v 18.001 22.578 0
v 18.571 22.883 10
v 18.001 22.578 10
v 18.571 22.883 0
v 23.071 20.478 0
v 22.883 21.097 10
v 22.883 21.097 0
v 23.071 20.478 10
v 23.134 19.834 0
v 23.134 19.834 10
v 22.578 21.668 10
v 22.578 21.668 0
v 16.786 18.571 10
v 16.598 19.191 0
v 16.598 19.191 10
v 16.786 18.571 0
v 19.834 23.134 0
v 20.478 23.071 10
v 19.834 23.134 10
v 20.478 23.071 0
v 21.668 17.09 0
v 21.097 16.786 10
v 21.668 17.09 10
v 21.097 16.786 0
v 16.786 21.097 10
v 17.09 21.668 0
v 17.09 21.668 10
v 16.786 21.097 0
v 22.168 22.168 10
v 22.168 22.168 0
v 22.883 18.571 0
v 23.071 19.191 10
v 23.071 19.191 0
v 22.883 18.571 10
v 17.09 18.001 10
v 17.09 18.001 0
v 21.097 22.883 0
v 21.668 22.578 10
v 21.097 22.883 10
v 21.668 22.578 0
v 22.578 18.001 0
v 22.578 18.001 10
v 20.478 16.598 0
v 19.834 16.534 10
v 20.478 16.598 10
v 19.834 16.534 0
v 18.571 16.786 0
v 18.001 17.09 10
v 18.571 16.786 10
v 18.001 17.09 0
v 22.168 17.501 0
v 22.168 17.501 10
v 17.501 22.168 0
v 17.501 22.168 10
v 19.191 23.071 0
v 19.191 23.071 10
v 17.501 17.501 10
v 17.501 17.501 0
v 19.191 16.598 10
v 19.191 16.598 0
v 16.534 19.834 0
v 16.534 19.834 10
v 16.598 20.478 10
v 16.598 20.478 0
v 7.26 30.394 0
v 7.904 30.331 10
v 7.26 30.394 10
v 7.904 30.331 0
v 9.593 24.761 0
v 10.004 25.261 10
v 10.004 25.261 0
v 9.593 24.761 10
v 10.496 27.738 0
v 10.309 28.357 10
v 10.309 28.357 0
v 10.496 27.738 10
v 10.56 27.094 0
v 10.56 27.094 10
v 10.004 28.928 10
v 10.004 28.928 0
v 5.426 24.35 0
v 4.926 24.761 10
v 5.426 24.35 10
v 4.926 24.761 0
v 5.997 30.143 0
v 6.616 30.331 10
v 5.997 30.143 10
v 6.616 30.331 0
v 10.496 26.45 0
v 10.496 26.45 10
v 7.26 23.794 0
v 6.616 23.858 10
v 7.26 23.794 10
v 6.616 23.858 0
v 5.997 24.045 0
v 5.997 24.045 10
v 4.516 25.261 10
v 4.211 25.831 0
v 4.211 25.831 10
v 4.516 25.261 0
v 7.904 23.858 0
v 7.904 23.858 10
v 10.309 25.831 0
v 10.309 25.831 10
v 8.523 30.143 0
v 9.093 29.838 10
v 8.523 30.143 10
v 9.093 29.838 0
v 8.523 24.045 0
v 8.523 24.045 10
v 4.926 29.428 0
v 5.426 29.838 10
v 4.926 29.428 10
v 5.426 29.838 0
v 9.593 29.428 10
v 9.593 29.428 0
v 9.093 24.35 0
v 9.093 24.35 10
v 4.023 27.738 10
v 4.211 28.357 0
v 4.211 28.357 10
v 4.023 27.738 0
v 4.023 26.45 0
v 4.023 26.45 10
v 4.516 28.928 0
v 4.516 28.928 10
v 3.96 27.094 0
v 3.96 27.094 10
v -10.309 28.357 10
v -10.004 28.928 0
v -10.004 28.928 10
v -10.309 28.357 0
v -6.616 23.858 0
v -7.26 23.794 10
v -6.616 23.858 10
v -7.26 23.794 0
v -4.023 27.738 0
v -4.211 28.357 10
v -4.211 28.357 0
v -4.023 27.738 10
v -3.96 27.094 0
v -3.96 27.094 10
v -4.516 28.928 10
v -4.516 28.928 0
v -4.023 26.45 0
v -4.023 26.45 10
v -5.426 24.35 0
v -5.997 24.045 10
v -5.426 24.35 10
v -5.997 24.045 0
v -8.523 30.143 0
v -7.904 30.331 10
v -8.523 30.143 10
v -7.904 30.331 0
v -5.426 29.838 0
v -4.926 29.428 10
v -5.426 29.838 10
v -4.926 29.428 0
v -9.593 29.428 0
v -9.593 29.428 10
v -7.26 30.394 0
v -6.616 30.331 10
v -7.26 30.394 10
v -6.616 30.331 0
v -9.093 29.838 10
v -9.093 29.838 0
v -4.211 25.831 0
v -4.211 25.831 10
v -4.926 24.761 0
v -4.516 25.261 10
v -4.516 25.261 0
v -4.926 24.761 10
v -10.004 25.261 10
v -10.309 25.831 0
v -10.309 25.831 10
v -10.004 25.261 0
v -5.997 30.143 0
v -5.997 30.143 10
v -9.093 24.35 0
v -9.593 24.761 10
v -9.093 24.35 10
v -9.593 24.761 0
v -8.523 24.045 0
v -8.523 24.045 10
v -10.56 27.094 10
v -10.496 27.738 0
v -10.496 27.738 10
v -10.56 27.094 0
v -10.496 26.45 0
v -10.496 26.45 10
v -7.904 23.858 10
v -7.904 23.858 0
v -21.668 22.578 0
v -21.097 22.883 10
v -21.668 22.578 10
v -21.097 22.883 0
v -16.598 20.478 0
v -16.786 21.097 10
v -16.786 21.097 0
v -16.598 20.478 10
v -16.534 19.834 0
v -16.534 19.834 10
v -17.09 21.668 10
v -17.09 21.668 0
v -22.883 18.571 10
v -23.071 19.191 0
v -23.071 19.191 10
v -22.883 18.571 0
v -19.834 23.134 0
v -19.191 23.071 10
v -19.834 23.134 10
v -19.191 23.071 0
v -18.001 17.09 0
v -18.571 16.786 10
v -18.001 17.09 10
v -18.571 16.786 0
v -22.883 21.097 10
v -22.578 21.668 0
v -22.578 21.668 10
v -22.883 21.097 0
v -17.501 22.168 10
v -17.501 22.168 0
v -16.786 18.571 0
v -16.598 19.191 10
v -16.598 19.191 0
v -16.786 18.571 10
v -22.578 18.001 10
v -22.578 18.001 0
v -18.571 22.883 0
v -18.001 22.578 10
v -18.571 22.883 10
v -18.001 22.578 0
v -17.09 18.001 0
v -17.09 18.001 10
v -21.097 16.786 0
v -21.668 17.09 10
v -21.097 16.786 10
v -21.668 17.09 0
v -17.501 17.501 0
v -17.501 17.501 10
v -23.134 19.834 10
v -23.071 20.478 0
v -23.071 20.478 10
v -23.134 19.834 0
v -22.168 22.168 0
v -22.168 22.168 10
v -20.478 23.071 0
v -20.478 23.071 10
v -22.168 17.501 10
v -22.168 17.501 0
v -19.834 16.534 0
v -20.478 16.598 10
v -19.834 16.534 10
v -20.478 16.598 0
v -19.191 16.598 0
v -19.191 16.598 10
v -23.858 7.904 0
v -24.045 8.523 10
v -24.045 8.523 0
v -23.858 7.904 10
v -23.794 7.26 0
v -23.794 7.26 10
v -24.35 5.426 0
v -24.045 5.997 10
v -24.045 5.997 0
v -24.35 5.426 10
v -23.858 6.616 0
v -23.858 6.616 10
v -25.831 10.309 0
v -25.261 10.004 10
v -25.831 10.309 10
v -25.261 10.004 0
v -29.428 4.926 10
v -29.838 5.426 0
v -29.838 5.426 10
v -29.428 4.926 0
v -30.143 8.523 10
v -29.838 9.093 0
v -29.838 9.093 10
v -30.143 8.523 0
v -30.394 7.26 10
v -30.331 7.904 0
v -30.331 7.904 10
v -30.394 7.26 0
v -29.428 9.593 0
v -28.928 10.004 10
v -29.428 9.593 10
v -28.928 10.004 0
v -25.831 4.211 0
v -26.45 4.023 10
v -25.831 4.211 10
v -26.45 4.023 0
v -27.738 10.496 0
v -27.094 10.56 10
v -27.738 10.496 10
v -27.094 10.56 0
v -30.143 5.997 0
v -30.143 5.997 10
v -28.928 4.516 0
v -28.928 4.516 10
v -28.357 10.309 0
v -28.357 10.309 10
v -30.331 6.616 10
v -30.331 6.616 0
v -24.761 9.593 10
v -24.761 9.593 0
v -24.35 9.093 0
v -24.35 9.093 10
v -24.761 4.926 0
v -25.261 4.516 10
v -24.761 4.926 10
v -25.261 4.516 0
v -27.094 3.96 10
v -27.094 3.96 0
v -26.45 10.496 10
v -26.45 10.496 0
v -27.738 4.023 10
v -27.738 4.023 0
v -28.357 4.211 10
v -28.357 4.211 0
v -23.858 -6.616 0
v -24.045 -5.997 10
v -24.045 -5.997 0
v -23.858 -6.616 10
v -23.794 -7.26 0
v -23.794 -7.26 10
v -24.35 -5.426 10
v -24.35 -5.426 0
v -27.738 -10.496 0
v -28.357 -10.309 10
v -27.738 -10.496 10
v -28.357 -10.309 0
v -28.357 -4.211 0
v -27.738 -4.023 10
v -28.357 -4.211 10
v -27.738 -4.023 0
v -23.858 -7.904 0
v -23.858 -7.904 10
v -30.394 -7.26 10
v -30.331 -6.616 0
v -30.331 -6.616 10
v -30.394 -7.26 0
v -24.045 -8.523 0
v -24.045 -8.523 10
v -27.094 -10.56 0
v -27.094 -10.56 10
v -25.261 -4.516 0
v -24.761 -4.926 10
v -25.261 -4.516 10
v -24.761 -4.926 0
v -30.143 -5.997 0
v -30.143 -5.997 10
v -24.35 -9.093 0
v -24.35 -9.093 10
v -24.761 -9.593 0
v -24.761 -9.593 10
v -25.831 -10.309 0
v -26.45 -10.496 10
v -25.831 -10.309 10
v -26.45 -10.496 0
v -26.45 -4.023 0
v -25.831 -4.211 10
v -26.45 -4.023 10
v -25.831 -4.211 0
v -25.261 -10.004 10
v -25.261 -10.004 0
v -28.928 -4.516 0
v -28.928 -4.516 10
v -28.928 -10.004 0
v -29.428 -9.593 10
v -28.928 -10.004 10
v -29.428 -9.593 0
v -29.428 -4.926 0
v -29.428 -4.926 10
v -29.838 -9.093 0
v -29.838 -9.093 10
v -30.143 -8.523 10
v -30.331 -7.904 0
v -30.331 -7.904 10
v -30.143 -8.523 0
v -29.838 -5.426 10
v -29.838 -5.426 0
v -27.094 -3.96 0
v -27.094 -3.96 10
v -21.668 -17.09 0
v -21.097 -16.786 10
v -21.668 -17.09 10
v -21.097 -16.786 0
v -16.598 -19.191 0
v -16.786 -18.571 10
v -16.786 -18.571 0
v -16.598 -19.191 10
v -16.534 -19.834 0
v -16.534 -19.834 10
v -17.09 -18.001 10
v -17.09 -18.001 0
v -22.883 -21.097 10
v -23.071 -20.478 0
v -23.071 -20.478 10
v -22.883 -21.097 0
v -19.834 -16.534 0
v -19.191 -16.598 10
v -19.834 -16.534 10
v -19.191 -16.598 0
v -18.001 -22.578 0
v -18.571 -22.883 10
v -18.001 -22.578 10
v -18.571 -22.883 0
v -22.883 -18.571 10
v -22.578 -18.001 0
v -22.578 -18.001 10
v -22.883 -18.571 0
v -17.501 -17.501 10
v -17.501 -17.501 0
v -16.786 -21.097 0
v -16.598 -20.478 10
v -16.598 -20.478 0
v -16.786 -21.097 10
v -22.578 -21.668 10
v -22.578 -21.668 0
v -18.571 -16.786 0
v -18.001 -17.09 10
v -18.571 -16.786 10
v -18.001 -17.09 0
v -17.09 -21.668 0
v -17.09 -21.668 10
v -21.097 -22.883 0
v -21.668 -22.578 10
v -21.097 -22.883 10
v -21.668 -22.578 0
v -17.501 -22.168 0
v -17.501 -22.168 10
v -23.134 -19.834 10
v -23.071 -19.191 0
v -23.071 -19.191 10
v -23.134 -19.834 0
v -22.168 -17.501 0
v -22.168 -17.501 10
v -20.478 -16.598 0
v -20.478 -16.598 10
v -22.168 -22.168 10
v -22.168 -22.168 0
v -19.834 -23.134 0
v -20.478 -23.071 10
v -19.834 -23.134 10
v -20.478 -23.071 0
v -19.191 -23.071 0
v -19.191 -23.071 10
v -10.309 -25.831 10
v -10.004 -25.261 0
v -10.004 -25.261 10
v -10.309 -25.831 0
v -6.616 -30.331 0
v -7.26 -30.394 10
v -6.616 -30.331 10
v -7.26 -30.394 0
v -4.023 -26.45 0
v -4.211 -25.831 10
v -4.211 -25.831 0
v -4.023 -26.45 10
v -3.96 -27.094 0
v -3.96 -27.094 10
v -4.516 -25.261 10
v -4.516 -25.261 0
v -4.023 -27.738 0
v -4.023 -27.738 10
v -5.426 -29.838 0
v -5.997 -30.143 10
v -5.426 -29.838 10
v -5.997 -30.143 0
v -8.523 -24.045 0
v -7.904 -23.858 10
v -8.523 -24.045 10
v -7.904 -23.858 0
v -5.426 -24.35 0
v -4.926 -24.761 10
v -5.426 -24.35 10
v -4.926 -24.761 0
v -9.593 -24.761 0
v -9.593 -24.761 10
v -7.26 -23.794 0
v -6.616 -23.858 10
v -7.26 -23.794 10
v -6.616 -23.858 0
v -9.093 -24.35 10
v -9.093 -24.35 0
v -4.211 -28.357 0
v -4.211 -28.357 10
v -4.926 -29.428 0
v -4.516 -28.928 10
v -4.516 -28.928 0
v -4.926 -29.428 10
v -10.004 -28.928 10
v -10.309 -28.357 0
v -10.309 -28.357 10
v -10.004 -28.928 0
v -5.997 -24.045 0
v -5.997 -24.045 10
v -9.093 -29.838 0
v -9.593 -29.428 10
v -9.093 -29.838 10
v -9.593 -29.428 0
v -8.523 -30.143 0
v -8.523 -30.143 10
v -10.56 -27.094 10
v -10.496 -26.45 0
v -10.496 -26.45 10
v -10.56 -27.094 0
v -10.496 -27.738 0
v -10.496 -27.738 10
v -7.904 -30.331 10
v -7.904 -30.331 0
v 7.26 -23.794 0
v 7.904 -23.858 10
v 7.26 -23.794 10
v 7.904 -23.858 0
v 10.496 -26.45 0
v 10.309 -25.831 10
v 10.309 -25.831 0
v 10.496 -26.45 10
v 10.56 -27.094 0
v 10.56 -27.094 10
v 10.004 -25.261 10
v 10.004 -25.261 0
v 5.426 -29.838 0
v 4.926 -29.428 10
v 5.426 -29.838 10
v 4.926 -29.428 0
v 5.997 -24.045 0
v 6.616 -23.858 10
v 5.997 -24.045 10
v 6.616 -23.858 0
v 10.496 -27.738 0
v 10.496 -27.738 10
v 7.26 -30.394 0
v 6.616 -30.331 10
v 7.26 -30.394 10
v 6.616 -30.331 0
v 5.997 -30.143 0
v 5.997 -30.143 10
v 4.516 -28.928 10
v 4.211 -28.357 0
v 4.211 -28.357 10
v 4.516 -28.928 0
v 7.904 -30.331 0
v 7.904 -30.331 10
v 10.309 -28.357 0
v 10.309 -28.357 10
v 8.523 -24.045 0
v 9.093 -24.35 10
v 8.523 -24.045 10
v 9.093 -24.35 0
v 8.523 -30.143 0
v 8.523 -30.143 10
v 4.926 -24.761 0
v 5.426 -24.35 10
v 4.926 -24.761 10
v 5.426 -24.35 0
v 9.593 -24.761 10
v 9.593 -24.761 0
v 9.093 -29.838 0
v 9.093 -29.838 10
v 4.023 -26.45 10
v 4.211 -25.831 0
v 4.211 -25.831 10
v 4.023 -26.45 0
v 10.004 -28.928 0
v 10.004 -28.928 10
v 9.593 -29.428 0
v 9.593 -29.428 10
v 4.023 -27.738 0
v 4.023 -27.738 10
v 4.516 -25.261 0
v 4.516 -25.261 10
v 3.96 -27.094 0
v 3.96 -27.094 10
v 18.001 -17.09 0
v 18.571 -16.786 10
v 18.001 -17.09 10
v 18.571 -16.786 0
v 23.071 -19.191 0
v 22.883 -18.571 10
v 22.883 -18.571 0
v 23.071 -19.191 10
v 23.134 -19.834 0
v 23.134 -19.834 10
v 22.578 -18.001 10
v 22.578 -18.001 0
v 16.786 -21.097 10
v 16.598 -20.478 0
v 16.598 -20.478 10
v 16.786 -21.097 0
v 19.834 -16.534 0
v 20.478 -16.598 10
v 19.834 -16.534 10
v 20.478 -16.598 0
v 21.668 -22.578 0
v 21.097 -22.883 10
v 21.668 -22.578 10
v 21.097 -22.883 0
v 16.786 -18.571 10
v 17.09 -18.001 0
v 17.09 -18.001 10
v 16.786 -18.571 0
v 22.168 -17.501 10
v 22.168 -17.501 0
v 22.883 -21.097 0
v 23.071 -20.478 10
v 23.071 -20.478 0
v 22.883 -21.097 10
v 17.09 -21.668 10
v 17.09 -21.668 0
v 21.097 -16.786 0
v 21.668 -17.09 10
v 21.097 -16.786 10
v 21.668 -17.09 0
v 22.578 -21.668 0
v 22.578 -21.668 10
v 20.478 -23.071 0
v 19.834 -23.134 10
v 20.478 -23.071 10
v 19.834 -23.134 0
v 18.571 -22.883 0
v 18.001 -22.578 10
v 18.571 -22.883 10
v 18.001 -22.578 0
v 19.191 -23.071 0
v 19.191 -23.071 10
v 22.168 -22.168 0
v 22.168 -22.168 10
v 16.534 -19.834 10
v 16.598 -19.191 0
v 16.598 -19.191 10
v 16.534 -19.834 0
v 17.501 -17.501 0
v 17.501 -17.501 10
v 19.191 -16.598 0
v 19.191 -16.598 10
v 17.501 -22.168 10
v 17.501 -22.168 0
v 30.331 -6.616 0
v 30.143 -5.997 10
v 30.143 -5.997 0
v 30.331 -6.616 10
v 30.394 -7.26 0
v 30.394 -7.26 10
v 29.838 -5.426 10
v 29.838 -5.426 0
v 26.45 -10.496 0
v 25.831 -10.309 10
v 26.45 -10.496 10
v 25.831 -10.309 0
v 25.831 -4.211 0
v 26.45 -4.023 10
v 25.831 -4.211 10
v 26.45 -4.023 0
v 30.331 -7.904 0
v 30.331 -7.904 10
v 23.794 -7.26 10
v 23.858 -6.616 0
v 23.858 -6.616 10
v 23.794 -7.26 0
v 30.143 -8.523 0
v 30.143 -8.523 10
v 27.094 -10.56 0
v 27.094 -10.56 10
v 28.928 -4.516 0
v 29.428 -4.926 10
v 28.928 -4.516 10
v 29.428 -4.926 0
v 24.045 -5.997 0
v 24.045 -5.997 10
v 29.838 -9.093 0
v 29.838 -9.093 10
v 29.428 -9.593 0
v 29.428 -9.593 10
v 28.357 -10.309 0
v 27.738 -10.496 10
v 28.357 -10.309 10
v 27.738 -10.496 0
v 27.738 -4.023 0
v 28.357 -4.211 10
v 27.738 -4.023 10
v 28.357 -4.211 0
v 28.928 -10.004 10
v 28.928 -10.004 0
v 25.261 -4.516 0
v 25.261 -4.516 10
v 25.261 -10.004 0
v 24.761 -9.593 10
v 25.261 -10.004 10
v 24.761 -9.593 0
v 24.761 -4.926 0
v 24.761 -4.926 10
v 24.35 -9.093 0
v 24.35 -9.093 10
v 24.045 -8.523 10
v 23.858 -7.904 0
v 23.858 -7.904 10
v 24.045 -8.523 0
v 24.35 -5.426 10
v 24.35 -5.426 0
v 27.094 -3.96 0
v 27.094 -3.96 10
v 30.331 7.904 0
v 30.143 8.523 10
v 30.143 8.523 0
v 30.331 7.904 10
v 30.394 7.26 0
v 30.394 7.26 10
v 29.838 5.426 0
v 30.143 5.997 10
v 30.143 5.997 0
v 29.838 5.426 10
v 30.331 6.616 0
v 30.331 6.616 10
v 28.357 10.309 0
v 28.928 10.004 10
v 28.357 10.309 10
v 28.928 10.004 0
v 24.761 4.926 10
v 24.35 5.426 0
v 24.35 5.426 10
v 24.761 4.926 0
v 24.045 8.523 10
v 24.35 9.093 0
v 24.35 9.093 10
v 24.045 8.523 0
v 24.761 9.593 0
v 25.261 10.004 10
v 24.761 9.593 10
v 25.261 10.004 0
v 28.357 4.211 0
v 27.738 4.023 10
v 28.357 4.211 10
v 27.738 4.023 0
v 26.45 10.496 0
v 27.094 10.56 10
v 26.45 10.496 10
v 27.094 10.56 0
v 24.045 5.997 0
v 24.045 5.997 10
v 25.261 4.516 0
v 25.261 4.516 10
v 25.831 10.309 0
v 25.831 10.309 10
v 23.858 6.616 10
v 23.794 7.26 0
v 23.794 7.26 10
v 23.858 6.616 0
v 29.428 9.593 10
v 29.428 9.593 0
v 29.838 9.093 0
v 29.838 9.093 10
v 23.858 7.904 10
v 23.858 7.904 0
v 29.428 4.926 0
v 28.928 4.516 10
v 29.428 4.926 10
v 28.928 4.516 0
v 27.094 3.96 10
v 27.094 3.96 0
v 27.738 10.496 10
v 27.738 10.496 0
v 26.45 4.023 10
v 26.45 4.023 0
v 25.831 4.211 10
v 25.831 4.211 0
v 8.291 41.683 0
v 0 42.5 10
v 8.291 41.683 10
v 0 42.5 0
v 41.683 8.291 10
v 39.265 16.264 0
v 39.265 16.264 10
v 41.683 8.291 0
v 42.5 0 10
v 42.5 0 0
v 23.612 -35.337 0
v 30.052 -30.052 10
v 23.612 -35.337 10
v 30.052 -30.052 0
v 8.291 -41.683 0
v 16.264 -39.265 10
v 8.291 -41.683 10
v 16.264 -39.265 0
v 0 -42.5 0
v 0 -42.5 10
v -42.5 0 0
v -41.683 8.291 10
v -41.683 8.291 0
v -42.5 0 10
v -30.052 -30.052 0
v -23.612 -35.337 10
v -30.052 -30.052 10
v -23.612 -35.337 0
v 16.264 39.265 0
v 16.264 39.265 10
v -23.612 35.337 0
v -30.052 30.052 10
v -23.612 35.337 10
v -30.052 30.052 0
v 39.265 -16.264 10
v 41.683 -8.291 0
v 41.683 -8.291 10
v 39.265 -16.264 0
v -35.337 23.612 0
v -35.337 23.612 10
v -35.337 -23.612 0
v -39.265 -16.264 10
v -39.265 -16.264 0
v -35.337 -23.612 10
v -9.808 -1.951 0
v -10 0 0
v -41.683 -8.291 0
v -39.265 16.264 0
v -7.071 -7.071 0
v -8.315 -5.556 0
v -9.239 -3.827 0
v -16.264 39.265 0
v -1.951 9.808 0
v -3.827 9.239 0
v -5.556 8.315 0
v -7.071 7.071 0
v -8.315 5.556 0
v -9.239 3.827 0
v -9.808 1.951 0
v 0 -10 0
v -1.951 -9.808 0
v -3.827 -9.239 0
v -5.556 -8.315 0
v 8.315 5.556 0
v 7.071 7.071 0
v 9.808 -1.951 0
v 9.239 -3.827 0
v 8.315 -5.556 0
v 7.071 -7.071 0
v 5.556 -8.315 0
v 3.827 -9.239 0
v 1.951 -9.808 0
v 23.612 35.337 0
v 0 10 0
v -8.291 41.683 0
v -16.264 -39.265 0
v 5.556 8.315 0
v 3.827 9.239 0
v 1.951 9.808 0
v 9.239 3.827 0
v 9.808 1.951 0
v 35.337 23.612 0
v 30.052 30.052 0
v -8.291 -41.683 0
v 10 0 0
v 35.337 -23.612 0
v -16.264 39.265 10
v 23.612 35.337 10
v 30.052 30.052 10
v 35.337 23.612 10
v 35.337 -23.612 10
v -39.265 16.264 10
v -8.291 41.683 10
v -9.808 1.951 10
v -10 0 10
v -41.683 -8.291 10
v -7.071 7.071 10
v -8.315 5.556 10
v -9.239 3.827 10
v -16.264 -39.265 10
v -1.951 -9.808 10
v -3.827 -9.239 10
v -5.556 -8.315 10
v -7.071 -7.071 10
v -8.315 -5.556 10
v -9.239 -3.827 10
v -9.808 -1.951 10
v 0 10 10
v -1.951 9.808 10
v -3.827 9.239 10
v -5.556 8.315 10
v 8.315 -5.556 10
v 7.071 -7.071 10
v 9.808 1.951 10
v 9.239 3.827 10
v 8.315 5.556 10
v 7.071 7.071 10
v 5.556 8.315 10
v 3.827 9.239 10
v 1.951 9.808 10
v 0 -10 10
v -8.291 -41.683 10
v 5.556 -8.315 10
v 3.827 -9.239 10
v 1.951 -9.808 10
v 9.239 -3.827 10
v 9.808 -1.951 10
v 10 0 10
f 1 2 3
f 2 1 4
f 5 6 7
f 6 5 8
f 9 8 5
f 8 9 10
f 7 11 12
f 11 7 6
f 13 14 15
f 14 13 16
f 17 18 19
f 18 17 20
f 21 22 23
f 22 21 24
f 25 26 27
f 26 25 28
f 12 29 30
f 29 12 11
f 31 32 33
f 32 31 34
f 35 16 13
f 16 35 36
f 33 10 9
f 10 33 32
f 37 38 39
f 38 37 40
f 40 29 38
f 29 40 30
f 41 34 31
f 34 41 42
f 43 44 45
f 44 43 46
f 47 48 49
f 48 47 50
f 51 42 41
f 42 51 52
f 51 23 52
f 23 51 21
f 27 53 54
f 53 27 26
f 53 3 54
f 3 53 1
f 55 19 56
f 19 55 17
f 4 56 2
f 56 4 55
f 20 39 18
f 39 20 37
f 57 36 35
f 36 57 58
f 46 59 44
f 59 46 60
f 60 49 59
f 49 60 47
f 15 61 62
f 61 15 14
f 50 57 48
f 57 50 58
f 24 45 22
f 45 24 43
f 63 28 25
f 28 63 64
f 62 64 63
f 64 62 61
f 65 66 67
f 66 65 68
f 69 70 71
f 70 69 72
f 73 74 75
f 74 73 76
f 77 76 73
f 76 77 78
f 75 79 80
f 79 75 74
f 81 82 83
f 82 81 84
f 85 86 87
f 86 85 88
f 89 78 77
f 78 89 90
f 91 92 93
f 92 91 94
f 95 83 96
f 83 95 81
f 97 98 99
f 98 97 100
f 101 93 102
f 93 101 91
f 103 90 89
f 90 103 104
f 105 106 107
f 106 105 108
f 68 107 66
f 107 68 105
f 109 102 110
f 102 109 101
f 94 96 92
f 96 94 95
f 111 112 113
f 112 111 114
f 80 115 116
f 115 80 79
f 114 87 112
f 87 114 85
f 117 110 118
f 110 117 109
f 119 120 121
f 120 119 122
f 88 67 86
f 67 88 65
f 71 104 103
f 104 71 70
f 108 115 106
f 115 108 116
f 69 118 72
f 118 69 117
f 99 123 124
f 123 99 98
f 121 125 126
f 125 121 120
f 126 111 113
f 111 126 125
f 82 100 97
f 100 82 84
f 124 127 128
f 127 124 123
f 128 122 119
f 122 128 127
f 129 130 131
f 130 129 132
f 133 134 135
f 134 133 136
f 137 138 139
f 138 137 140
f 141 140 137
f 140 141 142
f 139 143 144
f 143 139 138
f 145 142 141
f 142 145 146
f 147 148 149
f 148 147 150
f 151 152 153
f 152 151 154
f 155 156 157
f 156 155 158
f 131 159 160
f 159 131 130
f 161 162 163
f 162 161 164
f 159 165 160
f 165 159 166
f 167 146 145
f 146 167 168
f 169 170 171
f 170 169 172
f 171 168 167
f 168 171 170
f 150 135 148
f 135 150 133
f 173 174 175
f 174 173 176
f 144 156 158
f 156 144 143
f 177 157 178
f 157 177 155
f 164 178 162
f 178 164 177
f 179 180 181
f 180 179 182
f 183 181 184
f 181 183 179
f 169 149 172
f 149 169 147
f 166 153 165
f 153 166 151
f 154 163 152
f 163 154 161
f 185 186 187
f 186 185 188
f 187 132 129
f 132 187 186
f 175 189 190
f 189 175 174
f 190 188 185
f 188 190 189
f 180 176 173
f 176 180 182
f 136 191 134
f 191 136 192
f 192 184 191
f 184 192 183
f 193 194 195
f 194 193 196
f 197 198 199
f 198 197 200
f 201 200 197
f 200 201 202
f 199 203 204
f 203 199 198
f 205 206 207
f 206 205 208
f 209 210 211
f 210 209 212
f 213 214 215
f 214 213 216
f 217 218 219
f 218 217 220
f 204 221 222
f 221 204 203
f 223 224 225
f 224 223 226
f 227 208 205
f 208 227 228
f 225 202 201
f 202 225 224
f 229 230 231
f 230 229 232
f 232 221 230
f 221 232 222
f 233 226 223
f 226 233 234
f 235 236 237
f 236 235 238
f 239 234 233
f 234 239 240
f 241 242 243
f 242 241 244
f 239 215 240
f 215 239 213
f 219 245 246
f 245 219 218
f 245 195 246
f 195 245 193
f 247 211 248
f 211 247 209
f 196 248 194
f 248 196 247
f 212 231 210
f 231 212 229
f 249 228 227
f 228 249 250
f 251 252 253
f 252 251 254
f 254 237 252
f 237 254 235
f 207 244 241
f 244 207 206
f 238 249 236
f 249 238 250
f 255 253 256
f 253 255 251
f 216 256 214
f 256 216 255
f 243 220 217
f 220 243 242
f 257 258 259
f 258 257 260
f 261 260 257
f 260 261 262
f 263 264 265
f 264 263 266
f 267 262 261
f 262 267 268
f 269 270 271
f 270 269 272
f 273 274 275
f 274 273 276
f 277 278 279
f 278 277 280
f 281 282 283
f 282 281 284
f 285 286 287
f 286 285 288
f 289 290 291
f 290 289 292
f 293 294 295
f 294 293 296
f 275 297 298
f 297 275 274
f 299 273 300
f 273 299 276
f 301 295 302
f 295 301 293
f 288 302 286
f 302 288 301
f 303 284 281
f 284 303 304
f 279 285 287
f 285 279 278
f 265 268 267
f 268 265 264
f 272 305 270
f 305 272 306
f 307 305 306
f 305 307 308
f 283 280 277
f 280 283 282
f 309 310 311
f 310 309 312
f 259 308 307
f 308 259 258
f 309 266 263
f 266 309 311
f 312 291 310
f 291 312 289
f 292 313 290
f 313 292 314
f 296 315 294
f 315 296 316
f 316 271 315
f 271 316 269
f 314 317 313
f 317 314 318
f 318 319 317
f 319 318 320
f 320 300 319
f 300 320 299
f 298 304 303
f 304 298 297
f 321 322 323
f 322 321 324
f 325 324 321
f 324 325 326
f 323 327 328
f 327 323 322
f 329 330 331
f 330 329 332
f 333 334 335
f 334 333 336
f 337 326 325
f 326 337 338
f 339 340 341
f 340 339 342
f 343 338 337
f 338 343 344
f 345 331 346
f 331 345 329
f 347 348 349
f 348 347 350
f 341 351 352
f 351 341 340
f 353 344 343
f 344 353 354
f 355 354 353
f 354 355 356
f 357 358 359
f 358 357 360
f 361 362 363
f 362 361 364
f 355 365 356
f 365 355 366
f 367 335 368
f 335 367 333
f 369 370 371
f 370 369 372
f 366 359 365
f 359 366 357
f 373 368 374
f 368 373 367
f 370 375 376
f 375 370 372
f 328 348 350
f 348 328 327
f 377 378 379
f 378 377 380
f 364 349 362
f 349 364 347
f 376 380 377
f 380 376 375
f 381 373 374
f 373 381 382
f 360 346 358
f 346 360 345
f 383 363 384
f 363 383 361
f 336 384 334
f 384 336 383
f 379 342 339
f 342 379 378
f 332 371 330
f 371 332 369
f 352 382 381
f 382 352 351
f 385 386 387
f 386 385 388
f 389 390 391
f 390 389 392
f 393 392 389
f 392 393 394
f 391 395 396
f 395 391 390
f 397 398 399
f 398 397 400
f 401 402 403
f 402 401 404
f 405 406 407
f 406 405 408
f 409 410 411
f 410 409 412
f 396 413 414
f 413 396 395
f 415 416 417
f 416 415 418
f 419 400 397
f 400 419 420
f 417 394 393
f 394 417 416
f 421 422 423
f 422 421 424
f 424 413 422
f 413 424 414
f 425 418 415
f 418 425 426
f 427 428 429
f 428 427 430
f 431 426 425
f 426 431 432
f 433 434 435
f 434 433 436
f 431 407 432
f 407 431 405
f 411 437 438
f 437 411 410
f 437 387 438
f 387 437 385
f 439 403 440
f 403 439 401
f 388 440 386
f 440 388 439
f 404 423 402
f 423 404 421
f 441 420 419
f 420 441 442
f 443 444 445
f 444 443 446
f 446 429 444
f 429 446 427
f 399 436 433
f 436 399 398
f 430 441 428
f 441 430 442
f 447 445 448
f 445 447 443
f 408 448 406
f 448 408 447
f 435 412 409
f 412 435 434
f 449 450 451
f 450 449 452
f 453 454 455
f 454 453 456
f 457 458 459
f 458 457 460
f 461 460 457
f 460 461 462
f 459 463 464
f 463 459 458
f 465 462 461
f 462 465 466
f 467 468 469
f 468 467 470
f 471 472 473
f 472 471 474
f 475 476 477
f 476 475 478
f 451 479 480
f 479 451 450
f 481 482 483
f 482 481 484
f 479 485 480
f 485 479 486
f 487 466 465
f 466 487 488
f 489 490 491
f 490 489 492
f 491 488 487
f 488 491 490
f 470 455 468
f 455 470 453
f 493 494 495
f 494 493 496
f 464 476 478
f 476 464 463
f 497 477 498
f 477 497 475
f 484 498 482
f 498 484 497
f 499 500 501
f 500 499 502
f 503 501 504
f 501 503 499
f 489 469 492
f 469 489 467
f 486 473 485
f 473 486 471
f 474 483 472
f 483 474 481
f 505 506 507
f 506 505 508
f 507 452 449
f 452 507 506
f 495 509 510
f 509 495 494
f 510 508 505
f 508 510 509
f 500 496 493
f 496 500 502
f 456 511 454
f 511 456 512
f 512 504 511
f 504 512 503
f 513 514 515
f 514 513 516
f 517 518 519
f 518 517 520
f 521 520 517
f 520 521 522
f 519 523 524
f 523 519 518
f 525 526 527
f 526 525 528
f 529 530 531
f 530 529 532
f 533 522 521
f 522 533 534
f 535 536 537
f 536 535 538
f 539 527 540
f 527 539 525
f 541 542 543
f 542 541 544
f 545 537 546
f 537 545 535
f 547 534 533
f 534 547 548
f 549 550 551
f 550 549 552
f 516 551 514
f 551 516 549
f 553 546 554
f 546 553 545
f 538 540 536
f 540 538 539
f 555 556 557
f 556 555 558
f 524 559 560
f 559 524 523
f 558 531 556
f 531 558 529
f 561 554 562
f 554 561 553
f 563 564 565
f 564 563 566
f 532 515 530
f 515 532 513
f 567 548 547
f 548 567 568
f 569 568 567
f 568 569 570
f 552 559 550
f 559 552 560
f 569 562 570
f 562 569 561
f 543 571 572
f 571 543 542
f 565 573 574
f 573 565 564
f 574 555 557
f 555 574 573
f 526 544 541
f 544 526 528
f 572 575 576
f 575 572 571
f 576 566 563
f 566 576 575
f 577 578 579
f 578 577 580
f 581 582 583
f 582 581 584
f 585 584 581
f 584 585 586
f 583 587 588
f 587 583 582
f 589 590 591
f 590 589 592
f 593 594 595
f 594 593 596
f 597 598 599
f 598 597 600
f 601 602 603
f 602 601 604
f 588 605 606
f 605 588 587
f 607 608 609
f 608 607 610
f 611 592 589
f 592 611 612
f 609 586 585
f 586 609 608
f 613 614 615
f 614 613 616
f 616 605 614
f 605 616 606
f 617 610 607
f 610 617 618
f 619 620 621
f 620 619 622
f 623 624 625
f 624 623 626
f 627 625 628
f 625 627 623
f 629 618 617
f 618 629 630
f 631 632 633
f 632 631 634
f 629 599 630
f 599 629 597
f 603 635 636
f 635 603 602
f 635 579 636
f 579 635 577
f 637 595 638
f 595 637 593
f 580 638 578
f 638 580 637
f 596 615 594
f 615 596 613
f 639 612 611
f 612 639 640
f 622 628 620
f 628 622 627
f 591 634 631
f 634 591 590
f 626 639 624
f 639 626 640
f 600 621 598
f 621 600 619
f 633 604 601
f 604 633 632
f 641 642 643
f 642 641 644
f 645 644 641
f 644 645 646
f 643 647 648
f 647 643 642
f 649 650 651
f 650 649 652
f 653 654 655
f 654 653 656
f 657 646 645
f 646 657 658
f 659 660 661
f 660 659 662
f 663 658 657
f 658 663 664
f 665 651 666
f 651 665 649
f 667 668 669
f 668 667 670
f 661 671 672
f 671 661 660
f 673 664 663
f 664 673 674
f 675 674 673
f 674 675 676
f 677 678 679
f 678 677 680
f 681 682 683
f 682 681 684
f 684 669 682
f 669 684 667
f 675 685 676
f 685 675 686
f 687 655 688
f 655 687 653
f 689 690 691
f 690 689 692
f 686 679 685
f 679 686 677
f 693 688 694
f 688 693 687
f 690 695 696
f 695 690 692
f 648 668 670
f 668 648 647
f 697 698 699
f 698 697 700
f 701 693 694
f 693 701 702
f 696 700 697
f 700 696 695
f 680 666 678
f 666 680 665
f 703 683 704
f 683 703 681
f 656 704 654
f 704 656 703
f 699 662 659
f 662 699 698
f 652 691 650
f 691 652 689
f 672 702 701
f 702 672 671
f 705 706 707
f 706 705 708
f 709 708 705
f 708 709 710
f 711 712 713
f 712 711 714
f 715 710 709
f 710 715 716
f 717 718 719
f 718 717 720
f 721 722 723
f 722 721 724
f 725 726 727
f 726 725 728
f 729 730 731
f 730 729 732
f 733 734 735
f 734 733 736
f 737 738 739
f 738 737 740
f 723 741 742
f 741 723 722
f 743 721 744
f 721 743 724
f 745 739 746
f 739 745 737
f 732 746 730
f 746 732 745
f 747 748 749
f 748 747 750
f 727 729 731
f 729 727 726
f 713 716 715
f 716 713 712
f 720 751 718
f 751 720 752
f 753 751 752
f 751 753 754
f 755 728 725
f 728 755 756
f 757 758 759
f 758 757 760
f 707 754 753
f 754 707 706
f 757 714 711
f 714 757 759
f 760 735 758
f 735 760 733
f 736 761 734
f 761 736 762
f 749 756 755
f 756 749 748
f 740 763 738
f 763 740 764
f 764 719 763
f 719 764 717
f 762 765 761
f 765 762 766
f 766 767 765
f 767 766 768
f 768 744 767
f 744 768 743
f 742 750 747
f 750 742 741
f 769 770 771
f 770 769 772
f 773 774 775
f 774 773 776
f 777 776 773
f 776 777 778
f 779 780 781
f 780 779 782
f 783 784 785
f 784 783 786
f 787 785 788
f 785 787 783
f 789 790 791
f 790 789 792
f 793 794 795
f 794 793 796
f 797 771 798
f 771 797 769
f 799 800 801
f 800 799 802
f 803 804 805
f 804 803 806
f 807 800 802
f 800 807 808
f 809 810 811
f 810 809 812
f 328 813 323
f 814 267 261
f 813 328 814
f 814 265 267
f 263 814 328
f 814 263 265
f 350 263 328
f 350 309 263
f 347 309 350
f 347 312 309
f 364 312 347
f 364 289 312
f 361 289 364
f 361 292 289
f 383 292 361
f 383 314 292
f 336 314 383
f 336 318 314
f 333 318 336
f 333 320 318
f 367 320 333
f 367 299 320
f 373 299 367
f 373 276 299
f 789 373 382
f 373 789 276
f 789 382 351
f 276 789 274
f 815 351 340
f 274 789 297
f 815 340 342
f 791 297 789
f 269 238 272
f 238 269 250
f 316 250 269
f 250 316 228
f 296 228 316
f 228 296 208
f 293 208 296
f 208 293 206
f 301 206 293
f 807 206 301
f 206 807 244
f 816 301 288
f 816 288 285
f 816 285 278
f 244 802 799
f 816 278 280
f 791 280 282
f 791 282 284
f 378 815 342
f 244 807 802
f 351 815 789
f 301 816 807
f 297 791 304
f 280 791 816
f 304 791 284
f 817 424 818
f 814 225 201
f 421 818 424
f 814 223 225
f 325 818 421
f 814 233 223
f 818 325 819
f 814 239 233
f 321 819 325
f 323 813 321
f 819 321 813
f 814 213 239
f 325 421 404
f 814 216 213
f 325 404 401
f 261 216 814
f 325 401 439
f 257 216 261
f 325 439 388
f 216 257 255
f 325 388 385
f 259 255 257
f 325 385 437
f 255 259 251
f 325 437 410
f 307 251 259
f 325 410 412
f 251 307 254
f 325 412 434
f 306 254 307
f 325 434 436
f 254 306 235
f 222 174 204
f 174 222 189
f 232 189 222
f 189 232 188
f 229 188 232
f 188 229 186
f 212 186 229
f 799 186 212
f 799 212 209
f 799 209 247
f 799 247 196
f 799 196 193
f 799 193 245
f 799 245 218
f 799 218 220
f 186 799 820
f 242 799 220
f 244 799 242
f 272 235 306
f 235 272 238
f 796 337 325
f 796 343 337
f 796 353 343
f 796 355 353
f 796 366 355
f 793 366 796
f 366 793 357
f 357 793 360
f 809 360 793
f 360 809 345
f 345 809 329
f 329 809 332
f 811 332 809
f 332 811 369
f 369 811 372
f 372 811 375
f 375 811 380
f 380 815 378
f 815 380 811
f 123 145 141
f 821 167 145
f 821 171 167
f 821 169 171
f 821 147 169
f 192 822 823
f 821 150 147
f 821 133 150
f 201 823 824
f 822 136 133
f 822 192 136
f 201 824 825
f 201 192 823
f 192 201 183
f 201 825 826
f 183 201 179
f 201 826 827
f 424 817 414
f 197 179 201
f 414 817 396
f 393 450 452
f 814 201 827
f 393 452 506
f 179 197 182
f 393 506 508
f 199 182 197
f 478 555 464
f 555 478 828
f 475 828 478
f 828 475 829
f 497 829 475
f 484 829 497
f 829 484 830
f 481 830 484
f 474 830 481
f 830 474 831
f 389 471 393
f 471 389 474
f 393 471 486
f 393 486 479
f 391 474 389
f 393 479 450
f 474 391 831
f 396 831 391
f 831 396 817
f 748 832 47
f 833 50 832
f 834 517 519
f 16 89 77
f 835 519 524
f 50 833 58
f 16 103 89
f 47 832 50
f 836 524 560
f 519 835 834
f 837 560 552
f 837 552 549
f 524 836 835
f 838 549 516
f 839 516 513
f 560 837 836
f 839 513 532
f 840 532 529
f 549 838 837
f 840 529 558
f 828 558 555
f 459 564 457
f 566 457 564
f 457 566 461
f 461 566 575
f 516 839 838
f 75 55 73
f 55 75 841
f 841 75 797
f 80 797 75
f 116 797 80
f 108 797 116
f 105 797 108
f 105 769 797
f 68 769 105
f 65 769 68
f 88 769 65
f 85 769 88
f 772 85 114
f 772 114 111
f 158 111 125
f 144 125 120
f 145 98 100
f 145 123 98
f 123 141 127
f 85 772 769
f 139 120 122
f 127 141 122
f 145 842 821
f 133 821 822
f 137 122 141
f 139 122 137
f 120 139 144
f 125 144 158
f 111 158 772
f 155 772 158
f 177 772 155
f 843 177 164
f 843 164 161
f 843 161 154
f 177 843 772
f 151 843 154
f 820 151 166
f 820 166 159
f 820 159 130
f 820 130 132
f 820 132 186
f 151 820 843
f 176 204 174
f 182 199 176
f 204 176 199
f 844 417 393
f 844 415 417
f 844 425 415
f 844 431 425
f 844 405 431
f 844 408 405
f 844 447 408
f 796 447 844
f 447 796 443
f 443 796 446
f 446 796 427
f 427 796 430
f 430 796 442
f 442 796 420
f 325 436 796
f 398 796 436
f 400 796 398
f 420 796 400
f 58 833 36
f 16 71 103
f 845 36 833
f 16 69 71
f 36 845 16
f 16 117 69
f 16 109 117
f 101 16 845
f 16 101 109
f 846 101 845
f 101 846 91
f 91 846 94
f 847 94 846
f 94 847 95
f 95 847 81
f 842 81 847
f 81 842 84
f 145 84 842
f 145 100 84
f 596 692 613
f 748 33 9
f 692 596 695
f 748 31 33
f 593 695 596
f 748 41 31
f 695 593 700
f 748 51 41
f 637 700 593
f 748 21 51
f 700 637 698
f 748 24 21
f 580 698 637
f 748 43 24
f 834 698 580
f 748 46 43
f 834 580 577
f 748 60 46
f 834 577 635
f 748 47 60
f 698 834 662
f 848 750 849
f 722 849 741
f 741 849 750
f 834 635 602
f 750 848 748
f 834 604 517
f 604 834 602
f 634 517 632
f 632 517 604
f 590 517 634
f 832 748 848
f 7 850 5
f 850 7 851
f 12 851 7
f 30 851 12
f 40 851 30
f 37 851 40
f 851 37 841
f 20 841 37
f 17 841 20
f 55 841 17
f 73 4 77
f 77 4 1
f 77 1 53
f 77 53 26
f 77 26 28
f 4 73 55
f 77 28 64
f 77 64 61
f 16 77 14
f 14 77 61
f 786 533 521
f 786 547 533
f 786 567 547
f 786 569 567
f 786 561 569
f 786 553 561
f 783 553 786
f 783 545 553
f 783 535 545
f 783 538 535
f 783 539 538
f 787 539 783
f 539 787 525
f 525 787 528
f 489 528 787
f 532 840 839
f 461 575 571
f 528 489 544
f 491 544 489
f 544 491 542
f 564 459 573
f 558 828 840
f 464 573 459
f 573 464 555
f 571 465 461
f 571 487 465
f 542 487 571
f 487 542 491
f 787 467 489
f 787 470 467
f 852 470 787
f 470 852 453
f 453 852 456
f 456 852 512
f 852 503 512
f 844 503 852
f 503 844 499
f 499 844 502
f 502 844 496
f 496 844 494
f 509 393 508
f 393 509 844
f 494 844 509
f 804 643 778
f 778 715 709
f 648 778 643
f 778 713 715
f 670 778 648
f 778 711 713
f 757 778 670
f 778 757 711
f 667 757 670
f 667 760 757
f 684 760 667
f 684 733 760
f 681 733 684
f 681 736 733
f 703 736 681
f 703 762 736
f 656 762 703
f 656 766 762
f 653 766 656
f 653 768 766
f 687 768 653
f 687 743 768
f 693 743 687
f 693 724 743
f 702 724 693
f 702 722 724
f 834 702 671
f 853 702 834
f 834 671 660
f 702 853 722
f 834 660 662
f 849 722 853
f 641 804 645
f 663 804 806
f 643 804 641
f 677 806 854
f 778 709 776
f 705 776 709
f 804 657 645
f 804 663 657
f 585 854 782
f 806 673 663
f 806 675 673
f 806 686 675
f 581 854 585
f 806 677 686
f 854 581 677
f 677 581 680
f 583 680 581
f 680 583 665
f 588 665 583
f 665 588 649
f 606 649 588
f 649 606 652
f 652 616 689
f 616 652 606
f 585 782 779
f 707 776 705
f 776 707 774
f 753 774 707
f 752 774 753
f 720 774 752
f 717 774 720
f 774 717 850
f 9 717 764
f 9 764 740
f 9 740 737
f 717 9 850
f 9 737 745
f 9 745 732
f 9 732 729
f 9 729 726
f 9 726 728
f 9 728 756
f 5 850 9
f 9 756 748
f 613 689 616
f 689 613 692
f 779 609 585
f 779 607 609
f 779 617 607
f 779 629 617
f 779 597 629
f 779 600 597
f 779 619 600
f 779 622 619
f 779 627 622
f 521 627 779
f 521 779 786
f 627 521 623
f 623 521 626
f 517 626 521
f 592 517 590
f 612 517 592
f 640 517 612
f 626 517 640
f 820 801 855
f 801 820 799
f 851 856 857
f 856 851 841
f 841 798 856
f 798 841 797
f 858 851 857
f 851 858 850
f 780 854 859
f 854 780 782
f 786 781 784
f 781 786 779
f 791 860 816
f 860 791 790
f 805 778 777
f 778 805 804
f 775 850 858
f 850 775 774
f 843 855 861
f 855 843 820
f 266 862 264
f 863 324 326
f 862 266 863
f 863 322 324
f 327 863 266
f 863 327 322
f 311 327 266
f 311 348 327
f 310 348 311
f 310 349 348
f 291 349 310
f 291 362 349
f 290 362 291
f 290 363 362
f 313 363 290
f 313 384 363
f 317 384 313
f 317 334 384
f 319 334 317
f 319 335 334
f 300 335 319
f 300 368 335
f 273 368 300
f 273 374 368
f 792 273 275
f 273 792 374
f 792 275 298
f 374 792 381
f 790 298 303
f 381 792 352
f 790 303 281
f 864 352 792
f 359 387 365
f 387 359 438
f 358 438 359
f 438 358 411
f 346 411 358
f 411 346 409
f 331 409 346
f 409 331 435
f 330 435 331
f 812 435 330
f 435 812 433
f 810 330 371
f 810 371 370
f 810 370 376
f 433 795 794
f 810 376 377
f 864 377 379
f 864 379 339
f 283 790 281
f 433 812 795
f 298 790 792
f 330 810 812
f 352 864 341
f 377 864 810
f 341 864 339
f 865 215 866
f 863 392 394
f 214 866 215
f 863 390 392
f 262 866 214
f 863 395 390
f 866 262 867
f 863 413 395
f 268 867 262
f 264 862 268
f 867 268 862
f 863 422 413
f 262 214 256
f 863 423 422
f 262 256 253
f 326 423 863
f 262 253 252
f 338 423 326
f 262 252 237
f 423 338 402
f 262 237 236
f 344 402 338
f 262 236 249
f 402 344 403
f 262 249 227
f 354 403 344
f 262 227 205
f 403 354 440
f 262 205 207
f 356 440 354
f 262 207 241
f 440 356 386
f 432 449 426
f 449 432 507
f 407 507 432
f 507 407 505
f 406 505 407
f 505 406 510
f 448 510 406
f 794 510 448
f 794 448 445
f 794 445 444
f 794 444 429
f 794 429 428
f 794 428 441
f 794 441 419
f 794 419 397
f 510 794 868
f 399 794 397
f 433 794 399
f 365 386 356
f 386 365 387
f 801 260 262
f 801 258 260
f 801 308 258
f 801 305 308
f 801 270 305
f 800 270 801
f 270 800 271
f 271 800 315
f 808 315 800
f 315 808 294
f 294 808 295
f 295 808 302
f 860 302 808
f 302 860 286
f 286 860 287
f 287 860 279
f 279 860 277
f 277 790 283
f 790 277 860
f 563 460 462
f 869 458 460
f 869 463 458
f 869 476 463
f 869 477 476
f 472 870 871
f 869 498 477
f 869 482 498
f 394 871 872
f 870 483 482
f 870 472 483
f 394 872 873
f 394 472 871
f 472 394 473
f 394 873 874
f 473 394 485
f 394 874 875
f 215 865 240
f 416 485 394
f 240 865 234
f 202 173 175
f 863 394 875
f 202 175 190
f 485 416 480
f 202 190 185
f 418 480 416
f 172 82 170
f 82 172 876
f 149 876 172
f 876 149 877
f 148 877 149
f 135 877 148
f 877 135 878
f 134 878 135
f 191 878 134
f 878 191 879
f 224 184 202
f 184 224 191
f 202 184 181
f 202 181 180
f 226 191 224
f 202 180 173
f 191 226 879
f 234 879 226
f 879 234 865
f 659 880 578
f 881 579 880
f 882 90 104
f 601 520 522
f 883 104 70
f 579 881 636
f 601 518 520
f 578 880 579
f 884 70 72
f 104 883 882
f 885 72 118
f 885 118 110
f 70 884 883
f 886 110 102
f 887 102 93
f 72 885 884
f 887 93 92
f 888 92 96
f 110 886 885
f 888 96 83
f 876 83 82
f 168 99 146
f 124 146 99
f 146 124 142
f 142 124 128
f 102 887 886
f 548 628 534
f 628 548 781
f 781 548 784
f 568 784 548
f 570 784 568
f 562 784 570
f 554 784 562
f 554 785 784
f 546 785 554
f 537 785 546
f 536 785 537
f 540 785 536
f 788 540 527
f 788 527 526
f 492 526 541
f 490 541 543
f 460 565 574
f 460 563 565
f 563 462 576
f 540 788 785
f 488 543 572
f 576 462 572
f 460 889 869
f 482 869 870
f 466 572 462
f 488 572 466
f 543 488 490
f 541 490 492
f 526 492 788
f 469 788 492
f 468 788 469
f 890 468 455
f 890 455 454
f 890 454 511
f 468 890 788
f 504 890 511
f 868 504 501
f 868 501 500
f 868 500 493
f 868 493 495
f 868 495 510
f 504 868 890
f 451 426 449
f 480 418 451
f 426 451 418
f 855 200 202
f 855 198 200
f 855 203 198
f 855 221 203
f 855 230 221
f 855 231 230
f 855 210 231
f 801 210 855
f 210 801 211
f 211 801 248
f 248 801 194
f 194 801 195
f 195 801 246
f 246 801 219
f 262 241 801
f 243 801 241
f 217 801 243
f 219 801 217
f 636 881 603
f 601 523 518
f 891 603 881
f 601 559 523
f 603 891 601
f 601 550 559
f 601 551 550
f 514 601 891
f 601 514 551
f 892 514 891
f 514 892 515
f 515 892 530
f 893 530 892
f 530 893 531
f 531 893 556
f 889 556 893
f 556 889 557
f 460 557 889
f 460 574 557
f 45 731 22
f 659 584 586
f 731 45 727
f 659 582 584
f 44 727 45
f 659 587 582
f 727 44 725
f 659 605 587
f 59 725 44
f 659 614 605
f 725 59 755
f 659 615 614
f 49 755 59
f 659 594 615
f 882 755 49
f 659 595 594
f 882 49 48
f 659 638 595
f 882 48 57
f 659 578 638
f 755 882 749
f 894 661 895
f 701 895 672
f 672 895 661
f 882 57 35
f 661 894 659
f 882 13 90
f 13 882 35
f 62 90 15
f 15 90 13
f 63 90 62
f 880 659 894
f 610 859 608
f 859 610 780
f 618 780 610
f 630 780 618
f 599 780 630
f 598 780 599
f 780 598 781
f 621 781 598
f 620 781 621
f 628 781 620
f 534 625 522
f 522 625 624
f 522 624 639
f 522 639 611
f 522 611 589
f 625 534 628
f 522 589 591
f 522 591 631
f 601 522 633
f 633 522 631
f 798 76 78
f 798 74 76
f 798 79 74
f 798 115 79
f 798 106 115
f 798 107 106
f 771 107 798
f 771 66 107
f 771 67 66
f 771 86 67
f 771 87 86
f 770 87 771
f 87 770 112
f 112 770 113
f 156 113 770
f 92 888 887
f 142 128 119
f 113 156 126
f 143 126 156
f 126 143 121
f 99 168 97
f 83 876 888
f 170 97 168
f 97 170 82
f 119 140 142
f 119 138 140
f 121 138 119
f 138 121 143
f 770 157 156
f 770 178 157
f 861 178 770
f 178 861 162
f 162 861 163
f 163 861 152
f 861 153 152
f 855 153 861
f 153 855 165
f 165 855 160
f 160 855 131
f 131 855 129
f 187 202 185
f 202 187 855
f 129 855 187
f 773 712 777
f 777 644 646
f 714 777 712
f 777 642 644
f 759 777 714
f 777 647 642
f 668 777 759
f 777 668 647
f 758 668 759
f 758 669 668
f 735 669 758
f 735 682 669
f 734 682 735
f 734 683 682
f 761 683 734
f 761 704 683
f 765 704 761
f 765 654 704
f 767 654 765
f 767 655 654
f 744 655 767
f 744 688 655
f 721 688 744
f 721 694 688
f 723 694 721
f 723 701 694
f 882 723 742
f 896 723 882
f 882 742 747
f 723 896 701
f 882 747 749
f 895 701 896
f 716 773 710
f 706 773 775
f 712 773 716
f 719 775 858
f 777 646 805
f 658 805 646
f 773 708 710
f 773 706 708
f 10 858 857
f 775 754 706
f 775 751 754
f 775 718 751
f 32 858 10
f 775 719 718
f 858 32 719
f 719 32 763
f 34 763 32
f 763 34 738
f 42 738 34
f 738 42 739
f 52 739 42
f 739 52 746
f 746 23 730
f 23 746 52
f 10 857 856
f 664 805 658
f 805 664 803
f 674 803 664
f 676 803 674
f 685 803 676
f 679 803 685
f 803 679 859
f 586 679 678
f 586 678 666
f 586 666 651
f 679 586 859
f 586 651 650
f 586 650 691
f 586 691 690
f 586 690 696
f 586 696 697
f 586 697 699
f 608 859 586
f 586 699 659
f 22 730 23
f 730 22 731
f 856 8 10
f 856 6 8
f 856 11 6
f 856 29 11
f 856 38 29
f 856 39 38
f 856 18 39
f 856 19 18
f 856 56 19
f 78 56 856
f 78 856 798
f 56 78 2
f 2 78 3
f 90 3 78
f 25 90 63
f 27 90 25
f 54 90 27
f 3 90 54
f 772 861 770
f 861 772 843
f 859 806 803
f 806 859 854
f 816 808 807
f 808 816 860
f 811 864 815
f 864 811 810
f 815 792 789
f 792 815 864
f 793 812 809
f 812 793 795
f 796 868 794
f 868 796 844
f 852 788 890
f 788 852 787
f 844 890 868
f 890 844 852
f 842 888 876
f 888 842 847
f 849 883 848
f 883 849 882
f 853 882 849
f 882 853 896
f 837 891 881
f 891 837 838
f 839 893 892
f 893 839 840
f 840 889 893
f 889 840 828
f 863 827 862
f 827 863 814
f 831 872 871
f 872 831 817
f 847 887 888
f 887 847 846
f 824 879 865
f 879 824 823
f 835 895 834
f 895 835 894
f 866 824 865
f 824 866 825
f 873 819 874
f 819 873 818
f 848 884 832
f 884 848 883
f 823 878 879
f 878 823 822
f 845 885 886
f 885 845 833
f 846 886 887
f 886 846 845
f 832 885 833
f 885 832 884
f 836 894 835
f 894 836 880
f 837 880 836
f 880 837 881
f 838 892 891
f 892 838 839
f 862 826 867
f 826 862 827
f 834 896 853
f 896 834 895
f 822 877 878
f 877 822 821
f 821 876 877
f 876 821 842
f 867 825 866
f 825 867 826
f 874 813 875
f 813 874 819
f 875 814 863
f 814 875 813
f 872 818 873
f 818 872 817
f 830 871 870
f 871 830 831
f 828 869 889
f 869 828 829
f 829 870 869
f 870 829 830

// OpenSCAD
$fn = 32;

// ----------------------------------------------------------------------
// Flange Ø85 x 10
// 12 holes on a Ø56.1 bolt circle, bolted joints
// ----------------------------------------------------------------------

// --- parameters (mm) ---
flange_d = 85;   // outside diameter of the flange
thickness = 10;  // flange thickness
holes = 12;      // number of bolt holes
pcd = 56.1;      // bolt circle diameter
start_deg = 45;  // angle of the first hole, from +X
hole_d = 6.6;    // bolt hole diameter
bore_d = 20;     // central through bore
hub_d = 28;      // hub outside diameter
hub_h = 0;       // hub height above the flange face (0 = no hub)

// --- derived feature positions (mm) ---
height = thickness + hub_h;  // = 10   overall height of the part
pcd_r = pcd / 2;             // = 28.05   bolt circle radius
hole_step = 360 / holes;     // = 30   angular pitch
feature_centers = [
  [pcd_r * cos(start_deg + 0 * hole_step), pcd_r * sin(start_deg + 0 * hole_step)],
  [pcd_r * cos(start_deg + 1 * hole_step), pcd_r * sin(start_deg + 1 * hole_step)],
  [pcd_r * cos(start_deg + 2 * hole_step), pcd_r * sin(start_deg + 2 * hole_step)],
  [pcd_r * cos(start_deg + 3 * hole_step), pcd_r * sin(start_deg + 3 * hole_step)],
  [pcd_r * cos(start_deg + 4 * hole_step), pcd_r * sin(start_deg + 4 * hole_step)],
  [pcd_r * cos(start_deg + 5 * hole_step), pcd_r * sin(start_deg + 5 * hole_step)],
  [pcd_r * cos(start_deg + 6 * hole_step), pcd_r * sin(start_deg + 6 * hole_step)],
  [pcd_r * cos(start_deg + 7 * hole_step), pcd_r * sin(start_deg + 7 * hole_step)],
  [pcd_r * cos(start_deg + 8 * hole_step), pcd_r * sin(start_deg + 8 * hole_step)],
  [pcd_r * cos(start_deg + 9 * hole_step), pcd_r * sin(start_deg + 9 * hole_step)],
  [pcd_r * cos(start_deg + 10 * hole_step), pcd_r * sin(start_deg + 10 * hole_step)],
  [pcd_r * cos(start_deg + 11 * hole_step), pcd_r * sin(start_deg + 11 * hole_step)]
];   // bolt hole centres on the pitch circle

// flange disc, every hole and the bore cut straight through
difference() {
  union() {
    cylinder(d = flange_d, h = thickness);
  }
  translate([0, 0, -1]) cylinder(d = bore_d, h = height + 2);  // bore, through
  for (centre = feature_centers)
    translate([centre[0], centre[1], -1]) cylinder(d = hole_d, h = thickness + 2);
}
